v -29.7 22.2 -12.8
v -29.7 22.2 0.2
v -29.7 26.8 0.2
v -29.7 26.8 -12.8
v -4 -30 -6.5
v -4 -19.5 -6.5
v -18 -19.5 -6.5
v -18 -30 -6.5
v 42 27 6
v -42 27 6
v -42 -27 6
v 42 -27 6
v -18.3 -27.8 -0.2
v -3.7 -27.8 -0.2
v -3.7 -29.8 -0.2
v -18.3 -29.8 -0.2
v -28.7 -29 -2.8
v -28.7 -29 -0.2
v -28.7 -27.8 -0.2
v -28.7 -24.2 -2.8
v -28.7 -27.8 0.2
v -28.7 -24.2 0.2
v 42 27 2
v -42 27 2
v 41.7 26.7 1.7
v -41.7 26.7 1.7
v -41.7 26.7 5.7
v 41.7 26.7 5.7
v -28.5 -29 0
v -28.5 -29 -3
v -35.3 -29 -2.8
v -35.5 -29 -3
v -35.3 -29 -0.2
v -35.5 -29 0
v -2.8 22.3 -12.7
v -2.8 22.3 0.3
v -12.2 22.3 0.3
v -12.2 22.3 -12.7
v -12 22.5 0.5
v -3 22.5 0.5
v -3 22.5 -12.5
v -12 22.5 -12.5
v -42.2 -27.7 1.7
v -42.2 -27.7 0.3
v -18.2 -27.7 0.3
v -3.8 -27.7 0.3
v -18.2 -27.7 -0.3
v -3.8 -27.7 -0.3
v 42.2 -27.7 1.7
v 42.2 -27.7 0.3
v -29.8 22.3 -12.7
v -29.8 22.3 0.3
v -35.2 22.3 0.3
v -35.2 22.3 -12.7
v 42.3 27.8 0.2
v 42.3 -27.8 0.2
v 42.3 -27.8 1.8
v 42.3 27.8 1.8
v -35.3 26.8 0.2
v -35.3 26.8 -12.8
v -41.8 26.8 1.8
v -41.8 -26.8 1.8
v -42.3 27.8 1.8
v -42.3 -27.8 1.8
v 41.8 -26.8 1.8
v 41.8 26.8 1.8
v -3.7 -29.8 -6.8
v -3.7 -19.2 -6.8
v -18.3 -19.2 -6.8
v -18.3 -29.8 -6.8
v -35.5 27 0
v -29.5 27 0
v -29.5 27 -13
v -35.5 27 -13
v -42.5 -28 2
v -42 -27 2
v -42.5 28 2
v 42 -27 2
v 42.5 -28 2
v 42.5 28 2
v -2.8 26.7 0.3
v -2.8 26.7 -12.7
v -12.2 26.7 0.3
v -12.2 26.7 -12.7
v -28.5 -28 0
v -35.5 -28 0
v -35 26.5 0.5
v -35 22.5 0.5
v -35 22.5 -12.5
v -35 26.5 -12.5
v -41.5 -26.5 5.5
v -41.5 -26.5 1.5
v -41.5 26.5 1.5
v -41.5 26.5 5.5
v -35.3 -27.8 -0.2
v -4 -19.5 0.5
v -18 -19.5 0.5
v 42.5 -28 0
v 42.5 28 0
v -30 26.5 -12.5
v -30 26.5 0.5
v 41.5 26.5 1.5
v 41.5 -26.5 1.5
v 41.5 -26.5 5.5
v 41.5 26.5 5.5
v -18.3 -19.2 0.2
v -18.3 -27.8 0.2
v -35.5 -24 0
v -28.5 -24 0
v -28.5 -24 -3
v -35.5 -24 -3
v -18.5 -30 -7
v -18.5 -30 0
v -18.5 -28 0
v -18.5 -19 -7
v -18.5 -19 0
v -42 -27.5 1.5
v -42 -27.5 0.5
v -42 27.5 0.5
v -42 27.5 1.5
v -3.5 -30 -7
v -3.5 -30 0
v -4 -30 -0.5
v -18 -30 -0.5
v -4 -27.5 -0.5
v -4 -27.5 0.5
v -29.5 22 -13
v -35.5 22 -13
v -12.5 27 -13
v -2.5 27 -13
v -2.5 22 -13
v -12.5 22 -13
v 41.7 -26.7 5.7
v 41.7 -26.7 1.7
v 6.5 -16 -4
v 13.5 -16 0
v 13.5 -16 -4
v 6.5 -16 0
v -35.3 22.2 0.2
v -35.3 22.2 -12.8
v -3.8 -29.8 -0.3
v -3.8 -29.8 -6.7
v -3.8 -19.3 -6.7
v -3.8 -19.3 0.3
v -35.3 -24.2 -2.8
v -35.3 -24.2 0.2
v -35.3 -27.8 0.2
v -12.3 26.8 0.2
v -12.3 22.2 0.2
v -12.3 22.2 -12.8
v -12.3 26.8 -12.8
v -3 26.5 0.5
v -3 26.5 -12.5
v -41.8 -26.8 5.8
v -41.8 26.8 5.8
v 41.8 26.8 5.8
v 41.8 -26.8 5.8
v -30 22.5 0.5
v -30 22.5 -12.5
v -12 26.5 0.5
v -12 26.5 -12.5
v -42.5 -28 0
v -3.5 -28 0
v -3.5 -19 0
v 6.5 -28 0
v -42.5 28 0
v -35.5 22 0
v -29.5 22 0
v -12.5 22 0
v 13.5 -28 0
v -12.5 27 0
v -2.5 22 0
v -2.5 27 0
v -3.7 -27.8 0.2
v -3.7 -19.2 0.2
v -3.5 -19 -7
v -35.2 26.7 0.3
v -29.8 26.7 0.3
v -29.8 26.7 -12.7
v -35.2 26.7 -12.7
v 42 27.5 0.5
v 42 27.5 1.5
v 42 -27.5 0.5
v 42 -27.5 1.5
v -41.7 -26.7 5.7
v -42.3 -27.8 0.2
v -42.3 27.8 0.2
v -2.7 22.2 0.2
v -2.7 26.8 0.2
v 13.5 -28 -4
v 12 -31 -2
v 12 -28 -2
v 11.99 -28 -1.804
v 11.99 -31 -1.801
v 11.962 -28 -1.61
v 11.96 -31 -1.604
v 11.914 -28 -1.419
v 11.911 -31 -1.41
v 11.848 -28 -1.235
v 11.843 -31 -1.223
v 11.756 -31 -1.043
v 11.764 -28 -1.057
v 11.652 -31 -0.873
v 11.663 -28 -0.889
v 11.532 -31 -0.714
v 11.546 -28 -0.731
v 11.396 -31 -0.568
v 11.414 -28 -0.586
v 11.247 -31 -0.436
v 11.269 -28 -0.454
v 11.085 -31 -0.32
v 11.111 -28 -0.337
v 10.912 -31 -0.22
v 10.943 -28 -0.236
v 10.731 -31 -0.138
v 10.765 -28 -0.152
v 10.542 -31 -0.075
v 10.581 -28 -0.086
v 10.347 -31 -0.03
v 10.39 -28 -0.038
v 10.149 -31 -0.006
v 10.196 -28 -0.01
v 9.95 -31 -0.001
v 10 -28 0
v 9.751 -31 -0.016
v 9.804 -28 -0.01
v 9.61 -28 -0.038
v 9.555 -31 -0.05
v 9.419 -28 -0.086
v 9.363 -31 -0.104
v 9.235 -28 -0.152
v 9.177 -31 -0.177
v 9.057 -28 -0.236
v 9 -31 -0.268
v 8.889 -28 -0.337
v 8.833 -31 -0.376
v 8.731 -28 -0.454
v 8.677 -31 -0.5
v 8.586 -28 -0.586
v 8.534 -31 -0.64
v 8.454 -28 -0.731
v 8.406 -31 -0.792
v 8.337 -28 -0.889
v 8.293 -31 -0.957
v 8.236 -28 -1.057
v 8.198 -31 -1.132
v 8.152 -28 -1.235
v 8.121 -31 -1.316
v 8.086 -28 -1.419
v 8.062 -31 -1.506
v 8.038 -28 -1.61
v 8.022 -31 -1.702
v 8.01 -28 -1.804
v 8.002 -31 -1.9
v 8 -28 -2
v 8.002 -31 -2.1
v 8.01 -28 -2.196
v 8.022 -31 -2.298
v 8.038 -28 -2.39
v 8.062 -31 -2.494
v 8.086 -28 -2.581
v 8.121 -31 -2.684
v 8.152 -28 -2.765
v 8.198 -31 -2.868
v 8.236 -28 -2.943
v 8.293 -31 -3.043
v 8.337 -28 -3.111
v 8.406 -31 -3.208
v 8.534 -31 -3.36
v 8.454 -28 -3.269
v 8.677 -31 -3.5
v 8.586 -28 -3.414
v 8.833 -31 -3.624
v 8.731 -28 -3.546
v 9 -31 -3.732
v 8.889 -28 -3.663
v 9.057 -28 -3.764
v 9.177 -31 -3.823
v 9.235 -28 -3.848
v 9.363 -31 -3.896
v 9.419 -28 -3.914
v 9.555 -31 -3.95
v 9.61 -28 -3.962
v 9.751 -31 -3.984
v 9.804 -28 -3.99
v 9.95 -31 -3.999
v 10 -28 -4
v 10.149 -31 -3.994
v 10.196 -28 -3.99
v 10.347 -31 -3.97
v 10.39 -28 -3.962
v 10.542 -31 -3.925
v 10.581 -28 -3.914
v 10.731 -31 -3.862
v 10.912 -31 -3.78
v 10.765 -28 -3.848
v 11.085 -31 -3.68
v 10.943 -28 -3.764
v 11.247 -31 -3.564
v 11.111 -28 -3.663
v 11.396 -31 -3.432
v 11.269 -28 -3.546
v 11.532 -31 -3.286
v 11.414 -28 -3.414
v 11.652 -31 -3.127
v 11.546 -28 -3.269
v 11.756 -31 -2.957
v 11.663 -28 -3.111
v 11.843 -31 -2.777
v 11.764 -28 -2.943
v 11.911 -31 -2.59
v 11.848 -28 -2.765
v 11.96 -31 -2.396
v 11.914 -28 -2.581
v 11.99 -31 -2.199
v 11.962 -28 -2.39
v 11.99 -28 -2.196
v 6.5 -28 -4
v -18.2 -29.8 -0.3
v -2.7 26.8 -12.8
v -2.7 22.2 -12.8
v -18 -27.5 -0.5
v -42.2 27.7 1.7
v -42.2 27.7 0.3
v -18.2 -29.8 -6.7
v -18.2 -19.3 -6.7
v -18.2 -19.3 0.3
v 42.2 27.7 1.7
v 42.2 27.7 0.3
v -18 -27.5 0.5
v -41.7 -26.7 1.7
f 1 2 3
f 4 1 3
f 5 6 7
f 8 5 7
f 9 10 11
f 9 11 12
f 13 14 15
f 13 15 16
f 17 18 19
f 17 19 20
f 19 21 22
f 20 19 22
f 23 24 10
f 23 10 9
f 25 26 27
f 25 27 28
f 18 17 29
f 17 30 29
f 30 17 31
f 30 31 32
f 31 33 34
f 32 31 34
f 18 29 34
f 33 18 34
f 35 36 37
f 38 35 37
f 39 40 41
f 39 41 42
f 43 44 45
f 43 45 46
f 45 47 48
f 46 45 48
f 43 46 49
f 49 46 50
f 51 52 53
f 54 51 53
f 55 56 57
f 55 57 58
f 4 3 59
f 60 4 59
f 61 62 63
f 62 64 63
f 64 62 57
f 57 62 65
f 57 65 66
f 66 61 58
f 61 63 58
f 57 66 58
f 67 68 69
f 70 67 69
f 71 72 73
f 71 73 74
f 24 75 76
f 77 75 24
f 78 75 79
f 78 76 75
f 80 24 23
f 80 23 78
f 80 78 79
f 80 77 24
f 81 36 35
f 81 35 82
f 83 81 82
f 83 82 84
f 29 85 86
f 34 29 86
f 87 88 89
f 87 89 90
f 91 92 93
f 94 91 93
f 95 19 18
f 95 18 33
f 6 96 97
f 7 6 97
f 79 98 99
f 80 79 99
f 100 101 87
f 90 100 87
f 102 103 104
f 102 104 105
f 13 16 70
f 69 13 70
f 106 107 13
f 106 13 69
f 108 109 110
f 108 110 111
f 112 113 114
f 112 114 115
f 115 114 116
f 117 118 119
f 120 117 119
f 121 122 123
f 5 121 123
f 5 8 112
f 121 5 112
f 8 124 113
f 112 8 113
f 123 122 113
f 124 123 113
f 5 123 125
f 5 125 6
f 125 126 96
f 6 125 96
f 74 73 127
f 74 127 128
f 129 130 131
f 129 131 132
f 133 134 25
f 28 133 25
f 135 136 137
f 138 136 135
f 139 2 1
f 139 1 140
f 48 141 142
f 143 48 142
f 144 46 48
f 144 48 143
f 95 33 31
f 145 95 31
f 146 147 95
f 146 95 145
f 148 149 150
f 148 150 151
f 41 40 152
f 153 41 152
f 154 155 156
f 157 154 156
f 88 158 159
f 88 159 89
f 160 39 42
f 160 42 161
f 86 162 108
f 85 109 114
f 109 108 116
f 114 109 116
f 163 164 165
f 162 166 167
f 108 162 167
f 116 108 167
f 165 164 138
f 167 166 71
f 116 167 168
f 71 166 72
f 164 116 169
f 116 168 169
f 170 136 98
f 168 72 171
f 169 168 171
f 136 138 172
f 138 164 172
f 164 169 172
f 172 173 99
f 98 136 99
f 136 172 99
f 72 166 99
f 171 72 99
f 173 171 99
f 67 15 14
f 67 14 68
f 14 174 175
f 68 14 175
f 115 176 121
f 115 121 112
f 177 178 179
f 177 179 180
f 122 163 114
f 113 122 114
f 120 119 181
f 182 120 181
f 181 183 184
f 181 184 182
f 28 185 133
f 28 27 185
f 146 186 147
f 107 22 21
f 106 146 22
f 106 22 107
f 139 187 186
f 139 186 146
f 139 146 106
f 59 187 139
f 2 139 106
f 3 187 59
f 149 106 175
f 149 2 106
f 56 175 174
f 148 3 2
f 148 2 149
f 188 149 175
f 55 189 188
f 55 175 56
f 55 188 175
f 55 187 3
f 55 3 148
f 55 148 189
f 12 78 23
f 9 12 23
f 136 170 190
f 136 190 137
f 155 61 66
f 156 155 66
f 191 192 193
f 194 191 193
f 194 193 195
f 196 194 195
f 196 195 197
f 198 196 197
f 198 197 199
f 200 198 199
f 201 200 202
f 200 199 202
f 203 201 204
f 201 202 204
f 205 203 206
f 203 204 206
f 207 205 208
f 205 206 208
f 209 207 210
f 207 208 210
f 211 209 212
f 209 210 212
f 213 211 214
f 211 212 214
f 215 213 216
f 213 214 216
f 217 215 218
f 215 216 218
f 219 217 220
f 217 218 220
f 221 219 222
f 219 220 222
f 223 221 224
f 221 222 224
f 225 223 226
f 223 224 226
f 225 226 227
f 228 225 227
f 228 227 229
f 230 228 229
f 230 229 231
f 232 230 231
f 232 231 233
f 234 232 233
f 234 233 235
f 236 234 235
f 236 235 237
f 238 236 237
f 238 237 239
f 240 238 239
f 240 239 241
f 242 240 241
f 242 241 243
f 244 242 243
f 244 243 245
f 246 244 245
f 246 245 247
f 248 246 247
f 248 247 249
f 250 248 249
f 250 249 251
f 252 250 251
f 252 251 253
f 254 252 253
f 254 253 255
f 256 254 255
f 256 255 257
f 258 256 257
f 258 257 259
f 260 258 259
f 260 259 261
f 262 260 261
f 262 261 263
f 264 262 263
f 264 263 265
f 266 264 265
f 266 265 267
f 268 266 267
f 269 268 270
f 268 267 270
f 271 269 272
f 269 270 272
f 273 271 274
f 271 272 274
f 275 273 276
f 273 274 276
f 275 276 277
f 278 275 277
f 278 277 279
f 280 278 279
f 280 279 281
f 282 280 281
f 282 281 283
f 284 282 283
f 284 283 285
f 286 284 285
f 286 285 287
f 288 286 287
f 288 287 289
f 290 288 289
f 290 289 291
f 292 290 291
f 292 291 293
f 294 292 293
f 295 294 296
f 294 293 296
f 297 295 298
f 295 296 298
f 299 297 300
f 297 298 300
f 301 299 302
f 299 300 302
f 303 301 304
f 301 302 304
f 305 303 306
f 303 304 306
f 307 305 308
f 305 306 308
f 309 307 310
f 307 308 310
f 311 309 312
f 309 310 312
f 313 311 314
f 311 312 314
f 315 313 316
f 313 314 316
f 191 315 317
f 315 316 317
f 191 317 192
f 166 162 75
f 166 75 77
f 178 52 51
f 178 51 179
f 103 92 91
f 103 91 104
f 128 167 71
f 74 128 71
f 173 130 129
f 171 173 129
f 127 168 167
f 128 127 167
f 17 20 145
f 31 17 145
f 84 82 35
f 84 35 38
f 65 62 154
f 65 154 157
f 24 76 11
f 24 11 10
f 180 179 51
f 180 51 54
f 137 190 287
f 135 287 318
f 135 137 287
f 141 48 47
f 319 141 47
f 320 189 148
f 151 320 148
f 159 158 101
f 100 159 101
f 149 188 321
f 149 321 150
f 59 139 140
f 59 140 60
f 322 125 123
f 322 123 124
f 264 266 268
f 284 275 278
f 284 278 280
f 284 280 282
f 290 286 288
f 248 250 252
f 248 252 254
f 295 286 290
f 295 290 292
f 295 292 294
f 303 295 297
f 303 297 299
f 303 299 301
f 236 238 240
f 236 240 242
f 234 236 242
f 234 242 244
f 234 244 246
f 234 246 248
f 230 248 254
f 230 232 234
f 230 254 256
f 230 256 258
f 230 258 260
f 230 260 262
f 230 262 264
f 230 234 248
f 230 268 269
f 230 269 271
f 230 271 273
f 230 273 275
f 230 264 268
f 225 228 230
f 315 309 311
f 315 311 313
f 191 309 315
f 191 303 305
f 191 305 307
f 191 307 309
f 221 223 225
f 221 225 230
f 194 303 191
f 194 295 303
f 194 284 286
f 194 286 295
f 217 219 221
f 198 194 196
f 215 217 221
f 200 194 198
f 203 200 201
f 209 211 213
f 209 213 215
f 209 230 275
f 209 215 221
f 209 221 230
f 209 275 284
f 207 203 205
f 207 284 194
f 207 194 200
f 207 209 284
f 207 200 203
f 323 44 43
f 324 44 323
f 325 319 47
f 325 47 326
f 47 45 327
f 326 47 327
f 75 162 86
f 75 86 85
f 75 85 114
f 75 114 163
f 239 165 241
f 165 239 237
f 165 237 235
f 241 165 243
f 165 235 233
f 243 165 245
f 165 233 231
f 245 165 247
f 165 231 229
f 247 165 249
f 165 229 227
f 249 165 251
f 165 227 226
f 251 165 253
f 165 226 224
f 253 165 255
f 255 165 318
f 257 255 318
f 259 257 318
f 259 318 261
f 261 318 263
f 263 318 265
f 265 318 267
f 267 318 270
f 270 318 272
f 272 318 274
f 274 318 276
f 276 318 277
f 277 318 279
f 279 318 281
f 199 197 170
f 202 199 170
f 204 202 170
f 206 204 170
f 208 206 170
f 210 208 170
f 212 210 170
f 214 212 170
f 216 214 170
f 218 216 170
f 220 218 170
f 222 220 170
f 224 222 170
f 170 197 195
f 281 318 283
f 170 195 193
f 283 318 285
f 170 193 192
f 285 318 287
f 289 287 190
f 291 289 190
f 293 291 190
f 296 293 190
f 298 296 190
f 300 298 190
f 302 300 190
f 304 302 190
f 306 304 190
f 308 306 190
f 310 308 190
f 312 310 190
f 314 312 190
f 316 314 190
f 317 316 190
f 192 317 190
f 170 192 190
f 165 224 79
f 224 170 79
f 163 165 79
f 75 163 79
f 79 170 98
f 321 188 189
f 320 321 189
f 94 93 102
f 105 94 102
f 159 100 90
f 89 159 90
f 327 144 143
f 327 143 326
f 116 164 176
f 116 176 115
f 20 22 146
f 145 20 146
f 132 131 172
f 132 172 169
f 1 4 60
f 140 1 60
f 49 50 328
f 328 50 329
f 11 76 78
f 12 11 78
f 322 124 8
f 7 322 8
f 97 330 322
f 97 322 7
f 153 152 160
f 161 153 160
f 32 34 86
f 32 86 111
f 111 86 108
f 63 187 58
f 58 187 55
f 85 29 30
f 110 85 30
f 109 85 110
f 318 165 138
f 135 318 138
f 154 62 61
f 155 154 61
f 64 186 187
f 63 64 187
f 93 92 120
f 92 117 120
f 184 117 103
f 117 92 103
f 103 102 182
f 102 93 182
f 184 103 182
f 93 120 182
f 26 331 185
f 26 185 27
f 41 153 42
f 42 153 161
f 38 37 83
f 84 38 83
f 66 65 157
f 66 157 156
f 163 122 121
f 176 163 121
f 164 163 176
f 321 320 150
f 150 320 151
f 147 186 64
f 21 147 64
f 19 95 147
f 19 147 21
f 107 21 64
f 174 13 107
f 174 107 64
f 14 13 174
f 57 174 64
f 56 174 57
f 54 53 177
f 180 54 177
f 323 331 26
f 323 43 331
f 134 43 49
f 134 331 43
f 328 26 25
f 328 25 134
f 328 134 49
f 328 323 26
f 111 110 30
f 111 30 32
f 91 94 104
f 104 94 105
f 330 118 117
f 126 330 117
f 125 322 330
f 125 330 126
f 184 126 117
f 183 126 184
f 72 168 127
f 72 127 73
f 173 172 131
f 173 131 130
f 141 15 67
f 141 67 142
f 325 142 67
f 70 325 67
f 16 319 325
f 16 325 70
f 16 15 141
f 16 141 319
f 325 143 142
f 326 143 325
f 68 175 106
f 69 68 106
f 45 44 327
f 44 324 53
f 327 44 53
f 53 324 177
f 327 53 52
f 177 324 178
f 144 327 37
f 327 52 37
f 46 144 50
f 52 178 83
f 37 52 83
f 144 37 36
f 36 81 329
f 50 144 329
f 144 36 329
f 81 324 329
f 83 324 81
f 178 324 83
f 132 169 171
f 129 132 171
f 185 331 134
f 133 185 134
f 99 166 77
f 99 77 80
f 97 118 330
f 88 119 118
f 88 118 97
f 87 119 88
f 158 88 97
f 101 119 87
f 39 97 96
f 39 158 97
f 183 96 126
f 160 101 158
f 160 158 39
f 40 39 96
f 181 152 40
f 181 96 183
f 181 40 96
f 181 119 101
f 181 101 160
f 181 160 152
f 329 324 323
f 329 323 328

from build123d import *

# Parameters (mm, degrees)
ESQUISSE1_W        = 85
ESQUISSE1_H        = 56
BOSS_EXTRU_1_DEPTH = 2
ESQUISSE2_W        = 84
ESQUISSE2_H        = 54
BOSS_EXTRU_2_DEPTH = 4
ESQUISSE3_W        = 6
ESQUISSE3_H        = 5
ESQUISSE3_W_2      = 10
BOSS_EXTRU_3_DEPTH = 13
ESQUISSE4_W        = 15
ESQUISSE4_H        = 11
BOSS_EXTRU_4_DEPTH = 7
COQUE1_T           = -0.5
ESQUISSE5_W        = 7
ESQUISSE5_H        = 5
BOSS_EXTRU_5_DEPTH = 3
COQUE2_T           = -0.2
ESQUISSE6_W        = 7
ESQUISSE6_H        = 12
BOSS_EXTRU_6_DEPTH = 4
ESQUISSE7_R        = 2
BOSS_EXTRU_7_DEPTH = 3


with BuildPart() as part:
    # Esquisse1 → Boss.-Extru.1 (new body)
    with BuildSketch(Plane.XY):
        Rectangle(ESQUISSE1_W, ESQUISSE1_H)
    extrude(amount=BOSS_EXTRU_1_DEPTH)

    # Esquisse2 → Boss.-Extru.2 (add)
    with BuildSketch(Plane.XY.offset(2)):
        Rectangle(ESQUISSE2_W, ESQUISSE2_H)
    extrude(amount=BOSS_EXTRU_2_DEPTH)

    # Esquisse3 → Boss.-Extru.3 (add)
    with BuildSketch(Plane(origin=(0, 0, 0), x_dir=(-1, 0, 0), z_dir=(0, 0, -1))):
        with Locations((32.5, 24.5)):
            Rectangle(ESQUISSE3_W, ESQUISSE3_H)
        with Locations((7.5, 24.5)):
            Rectangle(ESQUISSE3_W_2, ESQUISSE3_H)
    extrude(amount=BOSS_EXTRU_3_DEPTH)

    # Esquisse4 → Boss.-Extru.4 (add)
    with BuildSketch(Plane(origin=(0, 0, 0), x_dir=(-1, 0, 0), z_dir=(0, 0, -1))):
        with Locations((11, -24.5)):
            Rectangle(ESQUISSE4_W, ESQUISSE4_H)
    extrude(amount=BOSS_EXTRU_4_DEPTH)

    # Coque1
    coque1_openings = [part.faces().sort_by_distance(p)[0] for p in [
        (-11, -30, -3.5),
    ]]
    offset(amount=COQUE1_T, openings=coque1_openings, kind=Kind.INTERSECTION)

    # Esquisse5 → Boss.-Extru.5 (add)
    with BuildSketch(Plane(origin=(0, 0, 0), x_dir=(-1, 0, 0), z_dir=(0, 0, -1))):
        with Locations((32, -26.5)):
            Rectangle(ESQUISSE5_W, ESQUISSE5_H)
    extrude(amount=BOSS_EXTRU_5_DEPTH)

    # Coque2
    coque2_openings = [part.faces().sort_by_distance(p)[0] for p in [
        (-32, -29, -1.5),
    ]]
    offset(amount=COQUE2_T, openings=coque2_openings, kind=Kind.INTERSECTION)

    # Esquisse6 → Boss.-Extru.6 (add)
    with BuildSketch(Plane(origin=(0, 0, 0), x_dir=(-1, 0, 0), z_dir=(0, 0, -1))):
        with Locations((-10, -22)):
            Rectangle(ESQUISSE6_W, ESQUISSE6_H)
    extrude(amount=BOSS_EXTRU_6_DEPTH)

    # Esquisse7 → Boss.-Extru.7 (add)
    with BuildSketch(Plane.XZ.offset(28)):
        with Locations((10, -2)):
            Circle(ESQUISSE7_R)
    extrude(amount=BOSS_EXTRU_7_DEPTH)


solid = part.part
